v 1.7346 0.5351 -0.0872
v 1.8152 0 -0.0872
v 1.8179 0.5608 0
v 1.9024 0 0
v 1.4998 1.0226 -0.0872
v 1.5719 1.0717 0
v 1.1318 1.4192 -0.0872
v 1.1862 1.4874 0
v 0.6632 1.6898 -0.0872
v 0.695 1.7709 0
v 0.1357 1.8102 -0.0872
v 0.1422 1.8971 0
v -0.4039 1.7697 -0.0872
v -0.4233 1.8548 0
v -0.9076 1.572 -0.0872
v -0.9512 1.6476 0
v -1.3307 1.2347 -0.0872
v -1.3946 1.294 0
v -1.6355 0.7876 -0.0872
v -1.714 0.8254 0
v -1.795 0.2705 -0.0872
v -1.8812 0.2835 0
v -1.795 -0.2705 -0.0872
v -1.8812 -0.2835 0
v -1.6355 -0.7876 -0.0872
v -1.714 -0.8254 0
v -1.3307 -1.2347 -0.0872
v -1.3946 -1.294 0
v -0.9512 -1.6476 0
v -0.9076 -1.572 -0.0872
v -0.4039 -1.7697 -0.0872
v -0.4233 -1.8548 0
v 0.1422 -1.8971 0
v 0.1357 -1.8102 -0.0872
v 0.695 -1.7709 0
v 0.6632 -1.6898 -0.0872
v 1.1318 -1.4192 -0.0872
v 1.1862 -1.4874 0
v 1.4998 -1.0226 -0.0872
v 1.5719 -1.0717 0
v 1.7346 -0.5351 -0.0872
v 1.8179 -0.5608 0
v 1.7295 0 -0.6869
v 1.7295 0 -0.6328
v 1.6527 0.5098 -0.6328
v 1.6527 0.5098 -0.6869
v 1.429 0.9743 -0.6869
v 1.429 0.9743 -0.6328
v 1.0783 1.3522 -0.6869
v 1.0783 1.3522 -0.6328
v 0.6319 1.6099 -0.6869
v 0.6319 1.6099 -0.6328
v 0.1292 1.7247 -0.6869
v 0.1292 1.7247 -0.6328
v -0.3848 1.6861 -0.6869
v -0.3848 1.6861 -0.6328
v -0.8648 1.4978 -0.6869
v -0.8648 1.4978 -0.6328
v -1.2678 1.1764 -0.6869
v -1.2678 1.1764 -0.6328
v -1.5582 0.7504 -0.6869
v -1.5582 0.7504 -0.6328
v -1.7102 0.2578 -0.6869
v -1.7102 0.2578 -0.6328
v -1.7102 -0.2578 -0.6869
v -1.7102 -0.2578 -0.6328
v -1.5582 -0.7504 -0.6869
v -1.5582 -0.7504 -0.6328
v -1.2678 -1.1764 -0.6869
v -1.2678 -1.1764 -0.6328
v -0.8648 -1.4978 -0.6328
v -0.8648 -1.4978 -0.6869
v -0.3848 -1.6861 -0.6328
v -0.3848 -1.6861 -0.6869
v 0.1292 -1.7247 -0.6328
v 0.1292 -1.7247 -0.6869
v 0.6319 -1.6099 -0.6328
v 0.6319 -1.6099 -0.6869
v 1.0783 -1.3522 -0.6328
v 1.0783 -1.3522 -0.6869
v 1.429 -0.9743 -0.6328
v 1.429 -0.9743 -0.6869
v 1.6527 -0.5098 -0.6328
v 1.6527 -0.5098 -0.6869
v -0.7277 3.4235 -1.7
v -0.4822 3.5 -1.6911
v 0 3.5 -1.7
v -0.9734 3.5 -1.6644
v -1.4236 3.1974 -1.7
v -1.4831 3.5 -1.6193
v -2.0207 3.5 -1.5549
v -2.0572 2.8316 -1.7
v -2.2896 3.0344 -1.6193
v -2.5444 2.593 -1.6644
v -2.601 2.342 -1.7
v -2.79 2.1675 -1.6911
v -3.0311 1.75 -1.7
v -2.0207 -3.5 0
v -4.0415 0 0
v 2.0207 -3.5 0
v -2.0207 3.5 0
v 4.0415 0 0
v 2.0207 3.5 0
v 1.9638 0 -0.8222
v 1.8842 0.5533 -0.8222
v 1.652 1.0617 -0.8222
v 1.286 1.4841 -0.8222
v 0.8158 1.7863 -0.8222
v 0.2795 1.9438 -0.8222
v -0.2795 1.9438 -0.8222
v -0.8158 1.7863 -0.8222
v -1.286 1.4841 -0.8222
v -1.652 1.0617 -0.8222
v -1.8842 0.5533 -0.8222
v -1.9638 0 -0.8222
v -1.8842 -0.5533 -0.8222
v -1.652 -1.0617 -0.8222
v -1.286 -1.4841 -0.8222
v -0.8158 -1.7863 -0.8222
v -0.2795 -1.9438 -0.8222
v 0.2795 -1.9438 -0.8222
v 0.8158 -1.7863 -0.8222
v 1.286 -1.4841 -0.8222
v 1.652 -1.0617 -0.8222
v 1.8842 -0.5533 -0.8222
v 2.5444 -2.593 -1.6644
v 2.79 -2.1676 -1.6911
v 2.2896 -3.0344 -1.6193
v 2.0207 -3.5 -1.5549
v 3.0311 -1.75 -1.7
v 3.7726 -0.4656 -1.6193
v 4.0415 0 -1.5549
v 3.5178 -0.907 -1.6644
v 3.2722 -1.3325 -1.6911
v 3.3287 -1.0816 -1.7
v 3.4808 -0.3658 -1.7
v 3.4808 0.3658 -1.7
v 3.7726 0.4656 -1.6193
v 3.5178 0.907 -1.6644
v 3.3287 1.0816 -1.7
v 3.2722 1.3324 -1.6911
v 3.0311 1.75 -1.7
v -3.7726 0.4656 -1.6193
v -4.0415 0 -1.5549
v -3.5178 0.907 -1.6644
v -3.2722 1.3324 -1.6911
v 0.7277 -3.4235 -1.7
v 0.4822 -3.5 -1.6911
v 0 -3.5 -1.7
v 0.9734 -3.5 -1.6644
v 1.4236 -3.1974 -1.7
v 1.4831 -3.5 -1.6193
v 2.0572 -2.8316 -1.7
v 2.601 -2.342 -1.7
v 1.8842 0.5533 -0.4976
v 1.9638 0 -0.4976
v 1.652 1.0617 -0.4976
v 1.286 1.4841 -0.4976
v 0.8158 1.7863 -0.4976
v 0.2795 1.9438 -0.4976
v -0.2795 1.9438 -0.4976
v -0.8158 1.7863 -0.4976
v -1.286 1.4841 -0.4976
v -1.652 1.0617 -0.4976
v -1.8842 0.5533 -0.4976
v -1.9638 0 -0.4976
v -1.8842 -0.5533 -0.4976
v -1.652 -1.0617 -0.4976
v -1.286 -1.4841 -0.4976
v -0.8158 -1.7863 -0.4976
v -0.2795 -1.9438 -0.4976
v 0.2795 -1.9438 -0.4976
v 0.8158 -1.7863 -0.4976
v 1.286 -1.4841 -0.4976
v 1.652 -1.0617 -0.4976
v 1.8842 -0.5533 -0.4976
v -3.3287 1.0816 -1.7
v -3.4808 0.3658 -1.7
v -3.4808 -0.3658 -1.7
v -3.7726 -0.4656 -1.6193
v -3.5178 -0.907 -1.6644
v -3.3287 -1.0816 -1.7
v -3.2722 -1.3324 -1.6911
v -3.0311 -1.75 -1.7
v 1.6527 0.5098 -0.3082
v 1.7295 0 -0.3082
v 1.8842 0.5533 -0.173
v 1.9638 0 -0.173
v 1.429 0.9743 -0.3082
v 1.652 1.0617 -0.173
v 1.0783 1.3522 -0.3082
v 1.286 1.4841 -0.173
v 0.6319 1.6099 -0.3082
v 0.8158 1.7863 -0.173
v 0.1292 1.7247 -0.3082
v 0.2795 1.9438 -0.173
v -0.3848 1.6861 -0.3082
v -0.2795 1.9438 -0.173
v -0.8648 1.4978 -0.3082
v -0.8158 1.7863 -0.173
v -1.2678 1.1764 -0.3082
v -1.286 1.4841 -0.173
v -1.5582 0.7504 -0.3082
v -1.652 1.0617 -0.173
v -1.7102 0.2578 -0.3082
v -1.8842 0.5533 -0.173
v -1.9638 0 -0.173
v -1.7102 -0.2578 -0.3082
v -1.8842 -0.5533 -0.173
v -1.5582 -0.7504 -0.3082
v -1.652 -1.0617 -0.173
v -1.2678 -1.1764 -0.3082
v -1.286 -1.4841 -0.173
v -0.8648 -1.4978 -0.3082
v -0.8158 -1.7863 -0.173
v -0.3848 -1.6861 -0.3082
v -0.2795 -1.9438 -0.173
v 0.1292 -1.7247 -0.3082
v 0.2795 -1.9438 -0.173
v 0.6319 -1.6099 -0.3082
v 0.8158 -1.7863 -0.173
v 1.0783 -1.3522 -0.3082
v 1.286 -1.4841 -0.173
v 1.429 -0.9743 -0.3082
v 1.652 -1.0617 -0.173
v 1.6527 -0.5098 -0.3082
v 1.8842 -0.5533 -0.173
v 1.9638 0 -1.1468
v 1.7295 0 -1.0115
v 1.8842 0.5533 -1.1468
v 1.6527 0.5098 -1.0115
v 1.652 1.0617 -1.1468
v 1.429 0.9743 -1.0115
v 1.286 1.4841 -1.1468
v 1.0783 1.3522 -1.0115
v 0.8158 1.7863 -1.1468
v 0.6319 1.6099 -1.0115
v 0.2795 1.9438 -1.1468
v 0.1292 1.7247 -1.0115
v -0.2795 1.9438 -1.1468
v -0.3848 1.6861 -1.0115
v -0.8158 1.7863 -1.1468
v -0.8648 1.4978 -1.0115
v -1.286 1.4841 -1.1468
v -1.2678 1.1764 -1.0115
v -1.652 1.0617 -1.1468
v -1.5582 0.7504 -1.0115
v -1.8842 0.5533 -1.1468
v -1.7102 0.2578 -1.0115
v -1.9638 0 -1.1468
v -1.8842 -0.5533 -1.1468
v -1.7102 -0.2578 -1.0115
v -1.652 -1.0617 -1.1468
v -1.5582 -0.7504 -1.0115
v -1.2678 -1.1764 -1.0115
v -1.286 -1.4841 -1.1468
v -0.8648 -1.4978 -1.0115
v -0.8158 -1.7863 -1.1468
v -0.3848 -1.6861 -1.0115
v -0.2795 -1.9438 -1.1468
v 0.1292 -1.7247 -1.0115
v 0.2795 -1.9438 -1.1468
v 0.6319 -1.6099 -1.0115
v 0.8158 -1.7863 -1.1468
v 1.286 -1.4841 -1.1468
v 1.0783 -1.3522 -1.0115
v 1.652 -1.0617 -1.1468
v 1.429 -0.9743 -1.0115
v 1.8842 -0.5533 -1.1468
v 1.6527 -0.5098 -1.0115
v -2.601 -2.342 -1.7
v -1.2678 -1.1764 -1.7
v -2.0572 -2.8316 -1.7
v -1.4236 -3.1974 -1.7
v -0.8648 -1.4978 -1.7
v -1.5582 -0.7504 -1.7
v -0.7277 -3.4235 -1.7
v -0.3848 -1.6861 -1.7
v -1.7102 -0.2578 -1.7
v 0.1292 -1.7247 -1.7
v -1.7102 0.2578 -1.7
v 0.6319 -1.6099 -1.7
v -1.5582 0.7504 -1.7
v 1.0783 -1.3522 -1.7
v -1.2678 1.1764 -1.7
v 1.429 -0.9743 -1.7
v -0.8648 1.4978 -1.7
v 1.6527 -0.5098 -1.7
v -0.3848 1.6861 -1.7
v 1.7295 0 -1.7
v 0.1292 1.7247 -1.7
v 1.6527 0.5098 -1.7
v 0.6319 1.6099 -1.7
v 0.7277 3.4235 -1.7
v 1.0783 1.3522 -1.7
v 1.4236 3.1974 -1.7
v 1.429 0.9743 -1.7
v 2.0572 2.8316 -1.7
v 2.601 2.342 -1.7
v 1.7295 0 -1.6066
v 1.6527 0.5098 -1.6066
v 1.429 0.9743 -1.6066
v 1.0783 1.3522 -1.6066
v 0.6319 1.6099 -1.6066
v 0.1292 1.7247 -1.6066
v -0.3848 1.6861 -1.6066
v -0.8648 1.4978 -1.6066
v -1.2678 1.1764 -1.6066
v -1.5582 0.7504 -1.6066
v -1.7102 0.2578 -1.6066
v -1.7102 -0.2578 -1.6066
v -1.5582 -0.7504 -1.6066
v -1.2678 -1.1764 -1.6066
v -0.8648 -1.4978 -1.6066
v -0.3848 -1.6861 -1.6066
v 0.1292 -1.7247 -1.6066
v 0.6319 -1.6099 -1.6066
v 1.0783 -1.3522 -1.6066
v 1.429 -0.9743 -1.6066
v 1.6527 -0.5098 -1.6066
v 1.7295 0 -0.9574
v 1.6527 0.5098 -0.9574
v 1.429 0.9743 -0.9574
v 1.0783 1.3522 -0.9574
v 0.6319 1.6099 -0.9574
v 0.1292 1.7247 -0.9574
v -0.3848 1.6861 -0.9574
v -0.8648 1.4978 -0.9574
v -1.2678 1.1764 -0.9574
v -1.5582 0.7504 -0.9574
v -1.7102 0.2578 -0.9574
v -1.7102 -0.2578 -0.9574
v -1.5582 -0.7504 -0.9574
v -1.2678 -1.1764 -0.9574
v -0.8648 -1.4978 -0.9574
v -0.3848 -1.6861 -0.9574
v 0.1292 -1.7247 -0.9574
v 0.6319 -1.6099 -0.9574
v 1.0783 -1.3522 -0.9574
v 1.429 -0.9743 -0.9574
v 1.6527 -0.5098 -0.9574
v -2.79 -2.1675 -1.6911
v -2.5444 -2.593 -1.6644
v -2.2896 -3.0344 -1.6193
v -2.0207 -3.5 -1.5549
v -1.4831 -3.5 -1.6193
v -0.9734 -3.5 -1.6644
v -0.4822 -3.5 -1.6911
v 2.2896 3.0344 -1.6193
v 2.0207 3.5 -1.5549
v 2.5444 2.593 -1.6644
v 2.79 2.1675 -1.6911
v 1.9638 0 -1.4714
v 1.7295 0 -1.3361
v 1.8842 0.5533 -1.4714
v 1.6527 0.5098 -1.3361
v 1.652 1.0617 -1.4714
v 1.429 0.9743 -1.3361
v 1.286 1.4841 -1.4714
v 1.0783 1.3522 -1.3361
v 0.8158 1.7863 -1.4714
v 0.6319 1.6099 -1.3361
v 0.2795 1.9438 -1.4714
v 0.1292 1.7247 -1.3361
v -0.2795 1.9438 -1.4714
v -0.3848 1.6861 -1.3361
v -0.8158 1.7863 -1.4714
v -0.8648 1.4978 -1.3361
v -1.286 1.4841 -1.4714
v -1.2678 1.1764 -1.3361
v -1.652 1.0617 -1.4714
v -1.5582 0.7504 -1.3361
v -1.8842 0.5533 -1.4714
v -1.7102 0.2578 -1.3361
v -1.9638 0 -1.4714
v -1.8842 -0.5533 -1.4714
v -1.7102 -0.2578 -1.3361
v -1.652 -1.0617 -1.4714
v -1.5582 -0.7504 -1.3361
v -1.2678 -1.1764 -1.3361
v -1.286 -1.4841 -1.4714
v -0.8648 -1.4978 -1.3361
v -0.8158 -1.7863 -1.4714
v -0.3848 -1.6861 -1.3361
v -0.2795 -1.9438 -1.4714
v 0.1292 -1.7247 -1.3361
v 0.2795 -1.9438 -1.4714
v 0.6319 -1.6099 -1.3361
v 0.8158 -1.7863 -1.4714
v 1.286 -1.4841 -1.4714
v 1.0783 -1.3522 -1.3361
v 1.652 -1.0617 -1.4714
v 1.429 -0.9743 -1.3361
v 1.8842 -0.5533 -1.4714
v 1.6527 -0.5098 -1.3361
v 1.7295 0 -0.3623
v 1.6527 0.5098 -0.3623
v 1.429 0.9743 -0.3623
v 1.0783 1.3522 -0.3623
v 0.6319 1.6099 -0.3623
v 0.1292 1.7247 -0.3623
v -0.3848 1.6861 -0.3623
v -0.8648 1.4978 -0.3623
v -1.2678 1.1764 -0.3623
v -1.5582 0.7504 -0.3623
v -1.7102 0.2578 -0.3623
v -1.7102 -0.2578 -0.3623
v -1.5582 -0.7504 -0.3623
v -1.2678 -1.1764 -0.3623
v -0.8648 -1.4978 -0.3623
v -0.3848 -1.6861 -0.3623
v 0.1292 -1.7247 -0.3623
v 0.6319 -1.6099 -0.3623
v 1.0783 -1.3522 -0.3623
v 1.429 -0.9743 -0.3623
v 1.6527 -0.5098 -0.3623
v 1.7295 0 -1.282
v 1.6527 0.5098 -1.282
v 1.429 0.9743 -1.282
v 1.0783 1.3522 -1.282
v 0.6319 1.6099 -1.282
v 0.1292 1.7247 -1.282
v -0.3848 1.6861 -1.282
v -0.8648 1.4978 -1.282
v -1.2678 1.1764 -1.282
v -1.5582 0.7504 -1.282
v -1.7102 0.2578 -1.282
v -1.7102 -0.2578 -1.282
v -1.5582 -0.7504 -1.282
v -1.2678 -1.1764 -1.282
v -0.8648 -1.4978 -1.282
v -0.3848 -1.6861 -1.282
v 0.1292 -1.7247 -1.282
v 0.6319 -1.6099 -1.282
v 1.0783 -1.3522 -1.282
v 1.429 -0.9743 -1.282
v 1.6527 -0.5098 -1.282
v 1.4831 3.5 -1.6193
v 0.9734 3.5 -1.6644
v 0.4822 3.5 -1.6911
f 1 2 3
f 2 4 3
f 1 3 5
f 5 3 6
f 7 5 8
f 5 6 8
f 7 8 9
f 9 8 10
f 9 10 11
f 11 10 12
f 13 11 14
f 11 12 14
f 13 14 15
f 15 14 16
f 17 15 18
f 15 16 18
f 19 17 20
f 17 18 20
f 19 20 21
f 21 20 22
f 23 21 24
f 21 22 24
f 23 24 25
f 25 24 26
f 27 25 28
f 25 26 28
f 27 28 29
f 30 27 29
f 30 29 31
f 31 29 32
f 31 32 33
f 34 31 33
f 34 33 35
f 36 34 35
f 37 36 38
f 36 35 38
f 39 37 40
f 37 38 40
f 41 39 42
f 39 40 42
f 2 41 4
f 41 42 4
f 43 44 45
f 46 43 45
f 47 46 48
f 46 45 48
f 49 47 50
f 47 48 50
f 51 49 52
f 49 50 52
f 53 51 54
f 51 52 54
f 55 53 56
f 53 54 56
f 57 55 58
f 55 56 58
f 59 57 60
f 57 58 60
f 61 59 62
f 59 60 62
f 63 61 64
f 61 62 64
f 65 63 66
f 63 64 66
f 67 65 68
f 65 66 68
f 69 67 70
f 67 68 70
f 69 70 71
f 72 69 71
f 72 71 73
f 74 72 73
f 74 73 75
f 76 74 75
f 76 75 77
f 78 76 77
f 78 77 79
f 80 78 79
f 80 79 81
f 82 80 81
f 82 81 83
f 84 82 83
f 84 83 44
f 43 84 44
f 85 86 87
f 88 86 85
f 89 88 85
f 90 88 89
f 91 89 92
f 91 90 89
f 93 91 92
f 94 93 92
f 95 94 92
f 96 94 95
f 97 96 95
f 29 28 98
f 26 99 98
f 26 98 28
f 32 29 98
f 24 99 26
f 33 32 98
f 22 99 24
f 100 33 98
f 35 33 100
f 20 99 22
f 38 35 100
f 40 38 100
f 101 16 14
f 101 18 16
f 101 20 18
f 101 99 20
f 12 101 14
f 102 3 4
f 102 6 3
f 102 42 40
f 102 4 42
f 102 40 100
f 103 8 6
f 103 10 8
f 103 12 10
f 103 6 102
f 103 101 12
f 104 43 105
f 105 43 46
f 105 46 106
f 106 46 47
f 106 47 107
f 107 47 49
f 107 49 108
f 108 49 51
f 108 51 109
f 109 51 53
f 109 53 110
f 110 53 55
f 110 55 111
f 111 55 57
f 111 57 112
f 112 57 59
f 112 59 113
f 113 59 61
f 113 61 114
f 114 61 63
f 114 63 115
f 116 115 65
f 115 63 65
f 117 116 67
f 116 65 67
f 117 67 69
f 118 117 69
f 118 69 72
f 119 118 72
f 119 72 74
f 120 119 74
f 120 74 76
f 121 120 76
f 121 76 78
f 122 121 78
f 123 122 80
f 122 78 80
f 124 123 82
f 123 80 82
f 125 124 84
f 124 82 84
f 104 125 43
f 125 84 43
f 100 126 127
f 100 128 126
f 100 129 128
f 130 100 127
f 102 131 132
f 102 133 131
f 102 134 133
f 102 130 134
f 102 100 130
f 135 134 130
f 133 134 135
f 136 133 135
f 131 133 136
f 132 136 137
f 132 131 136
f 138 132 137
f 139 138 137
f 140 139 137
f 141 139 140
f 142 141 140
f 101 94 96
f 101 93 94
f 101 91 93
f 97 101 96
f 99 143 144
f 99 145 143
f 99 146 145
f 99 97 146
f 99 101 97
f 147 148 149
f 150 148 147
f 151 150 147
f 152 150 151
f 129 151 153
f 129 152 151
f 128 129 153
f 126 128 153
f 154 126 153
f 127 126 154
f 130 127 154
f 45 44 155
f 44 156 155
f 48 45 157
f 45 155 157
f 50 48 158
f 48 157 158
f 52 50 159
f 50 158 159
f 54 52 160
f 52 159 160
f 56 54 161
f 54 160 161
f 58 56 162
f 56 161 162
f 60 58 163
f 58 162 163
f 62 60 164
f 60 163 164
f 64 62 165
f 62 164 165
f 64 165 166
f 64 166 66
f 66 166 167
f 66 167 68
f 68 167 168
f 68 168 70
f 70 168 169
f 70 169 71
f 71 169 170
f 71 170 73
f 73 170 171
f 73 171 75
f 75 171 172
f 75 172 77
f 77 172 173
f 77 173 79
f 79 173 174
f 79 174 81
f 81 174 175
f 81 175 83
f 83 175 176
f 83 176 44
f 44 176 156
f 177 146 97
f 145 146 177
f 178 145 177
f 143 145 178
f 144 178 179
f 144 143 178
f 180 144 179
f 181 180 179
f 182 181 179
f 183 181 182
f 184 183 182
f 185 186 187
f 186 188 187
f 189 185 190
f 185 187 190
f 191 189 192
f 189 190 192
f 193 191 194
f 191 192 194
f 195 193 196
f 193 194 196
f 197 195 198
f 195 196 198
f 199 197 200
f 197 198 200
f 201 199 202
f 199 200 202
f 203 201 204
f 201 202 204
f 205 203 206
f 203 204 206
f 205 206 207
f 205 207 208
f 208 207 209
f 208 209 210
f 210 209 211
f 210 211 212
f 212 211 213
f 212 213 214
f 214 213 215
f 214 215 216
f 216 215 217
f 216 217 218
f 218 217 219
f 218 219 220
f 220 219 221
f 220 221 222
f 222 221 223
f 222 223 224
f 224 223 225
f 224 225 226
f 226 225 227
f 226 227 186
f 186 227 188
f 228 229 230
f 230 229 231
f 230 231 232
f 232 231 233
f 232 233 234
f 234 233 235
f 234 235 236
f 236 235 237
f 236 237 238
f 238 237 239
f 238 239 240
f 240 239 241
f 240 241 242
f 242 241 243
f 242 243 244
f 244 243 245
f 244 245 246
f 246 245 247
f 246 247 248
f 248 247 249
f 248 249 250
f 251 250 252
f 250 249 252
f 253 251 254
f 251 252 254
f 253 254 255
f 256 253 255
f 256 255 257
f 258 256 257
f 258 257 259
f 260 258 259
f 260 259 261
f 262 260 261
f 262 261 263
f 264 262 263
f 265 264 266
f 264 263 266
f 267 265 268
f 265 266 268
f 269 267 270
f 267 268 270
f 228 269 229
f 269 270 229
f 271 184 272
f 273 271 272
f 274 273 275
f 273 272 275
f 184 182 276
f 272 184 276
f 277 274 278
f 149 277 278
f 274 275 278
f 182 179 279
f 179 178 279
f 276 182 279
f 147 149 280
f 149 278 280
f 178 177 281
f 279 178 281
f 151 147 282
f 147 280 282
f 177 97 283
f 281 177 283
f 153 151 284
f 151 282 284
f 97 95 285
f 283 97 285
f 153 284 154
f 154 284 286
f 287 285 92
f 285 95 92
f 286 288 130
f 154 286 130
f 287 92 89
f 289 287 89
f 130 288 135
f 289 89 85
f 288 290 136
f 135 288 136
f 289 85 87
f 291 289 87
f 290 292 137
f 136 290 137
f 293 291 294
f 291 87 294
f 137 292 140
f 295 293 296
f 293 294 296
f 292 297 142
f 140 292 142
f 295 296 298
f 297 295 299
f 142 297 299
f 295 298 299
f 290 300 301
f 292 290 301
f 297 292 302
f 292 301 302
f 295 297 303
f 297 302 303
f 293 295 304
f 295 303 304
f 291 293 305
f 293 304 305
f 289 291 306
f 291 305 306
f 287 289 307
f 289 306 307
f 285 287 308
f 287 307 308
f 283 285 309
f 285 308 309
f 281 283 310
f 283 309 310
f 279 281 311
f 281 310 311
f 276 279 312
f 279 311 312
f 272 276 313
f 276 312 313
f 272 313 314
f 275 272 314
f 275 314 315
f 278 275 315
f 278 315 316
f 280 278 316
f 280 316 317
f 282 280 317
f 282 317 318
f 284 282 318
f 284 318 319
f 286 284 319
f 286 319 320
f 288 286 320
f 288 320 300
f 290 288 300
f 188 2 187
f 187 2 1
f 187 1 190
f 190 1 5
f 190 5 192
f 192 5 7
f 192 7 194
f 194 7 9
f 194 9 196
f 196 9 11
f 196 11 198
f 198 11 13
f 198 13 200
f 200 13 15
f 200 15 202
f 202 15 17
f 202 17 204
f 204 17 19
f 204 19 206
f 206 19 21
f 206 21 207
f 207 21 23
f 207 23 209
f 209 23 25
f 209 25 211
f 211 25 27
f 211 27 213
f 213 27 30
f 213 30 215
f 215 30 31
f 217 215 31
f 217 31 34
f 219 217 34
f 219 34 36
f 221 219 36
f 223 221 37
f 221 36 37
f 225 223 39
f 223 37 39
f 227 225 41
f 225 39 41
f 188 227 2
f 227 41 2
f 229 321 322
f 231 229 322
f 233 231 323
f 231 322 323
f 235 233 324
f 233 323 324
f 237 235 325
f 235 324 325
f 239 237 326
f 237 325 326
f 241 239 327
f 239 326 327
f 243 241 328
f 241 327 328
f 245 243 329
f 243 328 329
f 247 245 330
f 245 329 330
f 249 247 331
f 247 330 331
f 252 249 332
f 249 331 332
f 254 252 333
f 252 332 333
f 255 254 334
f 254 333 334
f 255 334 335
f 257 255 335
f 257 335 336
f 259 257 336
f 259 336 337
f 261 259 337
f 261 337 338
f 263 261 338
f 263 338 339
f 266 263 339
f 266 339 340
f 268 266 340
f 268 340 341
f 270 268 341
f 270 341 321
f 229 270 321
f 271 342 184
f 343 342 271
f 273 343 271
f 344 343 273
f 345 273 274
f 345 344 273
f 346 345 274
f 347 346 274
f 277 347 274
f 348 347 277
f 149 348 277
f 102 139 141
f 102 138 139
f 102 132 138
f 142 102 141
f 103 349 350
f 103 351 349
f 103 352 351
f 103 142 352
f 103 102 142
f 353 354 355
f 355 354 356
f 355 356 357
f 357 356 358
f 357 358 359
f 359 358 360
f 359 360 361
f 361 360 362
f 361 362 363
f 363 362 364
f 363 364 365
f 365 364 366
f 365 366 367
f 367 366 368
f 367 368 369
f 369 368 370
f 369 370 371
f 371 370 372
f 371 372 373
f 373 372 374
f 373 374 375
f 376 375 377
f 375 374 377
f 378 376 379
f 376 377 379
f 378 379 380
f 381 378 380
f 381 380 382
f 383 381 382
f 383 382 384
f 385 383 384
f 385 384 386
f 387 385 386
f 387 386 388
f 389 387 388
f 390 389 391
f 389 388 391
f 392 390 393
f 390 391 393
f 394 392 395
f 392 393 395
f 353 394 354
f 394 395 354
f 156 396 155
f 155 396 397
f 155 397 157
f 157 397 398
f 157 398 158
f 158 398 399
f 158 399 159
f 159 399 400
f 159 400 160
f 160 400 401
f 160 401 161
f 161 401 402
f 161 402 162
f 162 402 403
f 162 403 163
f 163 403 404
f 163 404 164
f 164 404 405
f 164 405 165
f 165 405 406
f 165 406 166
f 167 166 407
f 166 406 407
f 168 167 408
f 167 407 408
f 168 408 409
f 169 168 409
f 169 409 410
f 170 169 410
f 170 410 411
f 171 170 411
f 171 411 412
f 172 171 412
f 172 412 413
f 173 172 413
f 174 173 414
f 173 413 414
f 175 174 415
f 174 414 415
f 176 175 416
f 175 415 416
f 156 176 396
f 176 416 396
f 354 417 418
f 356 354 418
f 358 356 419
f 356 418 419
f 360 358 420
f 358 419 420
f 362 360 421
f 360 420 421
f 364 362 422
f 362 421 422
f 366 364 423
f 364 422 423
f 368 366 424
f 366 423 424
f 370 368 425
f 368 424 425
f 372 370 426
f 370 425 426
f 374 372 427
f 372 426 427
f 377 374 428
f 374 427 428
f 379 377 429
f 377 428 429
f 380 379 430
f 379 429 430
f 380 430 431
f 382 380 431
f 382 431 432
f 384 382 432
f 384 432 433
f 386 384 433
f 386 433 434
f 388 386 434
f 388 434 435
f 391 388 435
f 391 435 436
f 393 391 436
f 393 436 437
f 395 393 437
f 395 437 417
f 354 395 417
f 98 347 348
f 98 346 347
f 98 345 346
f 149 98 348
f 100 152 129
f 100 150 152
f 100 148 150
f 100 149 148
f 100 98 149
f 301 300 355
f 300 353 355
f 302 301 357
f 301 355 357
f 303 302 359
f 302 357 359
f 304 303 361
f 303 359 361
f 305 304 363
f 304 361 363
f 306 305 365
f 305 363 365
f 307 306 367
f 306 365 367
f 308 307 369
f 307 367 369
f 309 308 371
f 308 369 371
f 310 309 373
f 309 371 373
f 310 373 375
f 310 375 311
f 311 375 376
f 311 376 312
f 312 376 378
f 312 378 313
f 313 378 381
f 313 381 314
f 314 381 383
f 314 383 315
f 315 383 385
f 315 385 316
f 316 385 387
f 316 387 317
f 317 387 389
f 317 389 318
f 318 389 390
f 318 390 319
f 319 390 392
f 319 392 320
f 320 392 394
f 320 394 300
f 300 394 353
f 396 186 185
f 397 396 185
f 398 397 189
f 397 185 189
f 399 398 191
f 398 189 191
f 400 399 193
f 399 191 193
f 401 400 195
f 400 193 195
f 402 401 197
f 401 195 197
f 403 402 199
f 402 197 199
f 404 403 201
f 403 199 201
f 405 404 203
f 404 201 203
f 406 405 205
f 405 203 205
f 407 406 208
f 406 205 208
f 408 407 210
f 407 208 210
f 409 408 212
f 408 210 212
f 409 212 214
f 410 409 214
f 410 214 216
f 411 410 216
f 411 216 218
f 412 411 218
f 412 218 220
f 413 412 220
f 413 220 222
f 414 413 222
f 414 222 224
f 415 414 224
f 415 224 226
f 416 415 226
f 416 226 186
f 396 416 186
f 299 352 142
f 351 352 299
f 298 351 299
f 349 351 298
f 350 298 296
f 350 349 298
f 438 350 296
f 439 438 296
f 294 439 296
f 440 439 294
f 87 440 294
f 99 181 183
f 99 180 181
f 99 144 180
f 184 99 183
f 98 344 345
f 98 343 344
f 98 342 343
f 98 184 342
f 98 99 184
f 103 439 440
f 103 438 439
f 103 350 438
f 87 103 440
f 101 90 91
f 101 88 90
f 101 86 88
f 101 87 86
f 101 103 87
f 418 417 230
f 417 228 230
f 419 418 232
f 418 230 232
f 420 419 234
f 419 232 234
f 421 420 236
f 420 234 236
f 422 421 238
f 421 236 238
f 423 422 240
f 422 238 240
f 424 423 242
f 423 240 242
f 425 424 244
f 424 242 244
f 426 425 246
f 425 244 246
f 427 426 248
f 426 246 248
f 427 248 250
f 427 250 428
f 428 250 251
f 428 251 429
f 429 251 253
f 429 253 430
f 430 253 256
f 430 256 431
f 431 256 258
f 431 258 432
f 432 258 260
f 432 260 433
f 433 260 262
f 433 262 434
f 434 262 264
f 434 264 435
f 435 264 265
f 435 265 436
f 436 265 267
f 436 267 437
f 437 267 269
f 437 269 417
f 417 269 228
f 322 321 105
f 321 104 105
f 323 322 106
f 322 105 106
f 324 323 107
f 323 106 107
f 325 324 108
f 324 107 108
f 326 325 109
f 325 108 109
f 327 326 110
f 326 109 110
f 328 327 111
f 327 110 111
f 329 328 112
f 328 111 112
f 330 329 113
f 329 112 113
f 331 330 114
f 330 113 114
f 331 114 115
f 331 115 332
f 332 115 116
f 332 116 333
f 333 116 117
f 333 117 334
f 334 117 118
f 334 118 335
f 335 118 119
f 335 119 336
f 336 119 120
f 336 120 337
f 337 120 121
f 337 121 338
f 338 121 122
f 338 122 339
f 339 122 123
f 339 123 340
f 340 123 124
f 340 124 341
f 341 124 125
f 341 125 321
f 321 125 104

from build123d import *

# Parameters (mm, degrees)
SKETCH1_R        = 1.7295
BASENUT_DEPTH    = 1.7
CHAMFER1_SIZE    = 0.17295
LPATTERN10_COUNT = 5
LPATTERN10_PITCH = 0.3246


with BuildPart() as part:
    # Sketch1 → BaseNut (new body)
    with BuildSketch(Plane.XY):
        Polygon((2.020725942, -3.5), (4.041451884, 0), (2.020725942, 3.5), (-2.020725942, 3.5), (-4.041451884, 0), (-2.020725942, -3.5), align=None)
        Circle(SKETCH1_R, mode=Mode.SUBTRACT)
    extrude(amount=-BASENUT_DEPTH)

    # Sketch2 → Double-Chamfer (revolve, cut)
    with BuildSketch(Plane(origin=(0, 0, 0), x_dir=(1, 0, 0), z_dir=(0, 1, 0))):
        Polygon((-4.041451884, 1.7), (-3.5, 1.7), (-4.041451884, 1.554918405), align=None)
    revolve(axis=Axis((0, 0, -3.375940562), (0, 0, 1)), mode=Mode.SUBTRACT)

    # Chamfer1
    chamfer1_edges = [part.edges().sort_by_distance(p)[0] for p in [
        (-1.7295, 0, 0),
    ]]
    chamfer(chamfer1_edges, length=CHAMFER1_SIZE)

    # Sketch3 → Cut-Revolve10 (revolve, cut)
    with BuildSketch(Plane(origin=(0, 0, 0), x_dir=(1, 0, 0), z_dir=(0, 1, 0))):
        Polygon((1.459, 0.3082), (1.7295, 0.3082), (1.963759872, 0.17295), (1.7295, 0.0377), (1.459, 0.0377), align=None)
    cut_revolve10 = revolve(axis=Axis((0, 0, -2.739364781), (0, 0, 1)), mode=Mode.SUBTRACT)

    # LPattern10: Cut-Revolve10 ×5
    with Locations(*[(0, 0, -i * LPATTERN10_PITCH) for i in range(1, LPATTERN10_COUNT)]):
        add(cut_revolve10, mode=Mode.SUBTRACT)


solid = part.part
